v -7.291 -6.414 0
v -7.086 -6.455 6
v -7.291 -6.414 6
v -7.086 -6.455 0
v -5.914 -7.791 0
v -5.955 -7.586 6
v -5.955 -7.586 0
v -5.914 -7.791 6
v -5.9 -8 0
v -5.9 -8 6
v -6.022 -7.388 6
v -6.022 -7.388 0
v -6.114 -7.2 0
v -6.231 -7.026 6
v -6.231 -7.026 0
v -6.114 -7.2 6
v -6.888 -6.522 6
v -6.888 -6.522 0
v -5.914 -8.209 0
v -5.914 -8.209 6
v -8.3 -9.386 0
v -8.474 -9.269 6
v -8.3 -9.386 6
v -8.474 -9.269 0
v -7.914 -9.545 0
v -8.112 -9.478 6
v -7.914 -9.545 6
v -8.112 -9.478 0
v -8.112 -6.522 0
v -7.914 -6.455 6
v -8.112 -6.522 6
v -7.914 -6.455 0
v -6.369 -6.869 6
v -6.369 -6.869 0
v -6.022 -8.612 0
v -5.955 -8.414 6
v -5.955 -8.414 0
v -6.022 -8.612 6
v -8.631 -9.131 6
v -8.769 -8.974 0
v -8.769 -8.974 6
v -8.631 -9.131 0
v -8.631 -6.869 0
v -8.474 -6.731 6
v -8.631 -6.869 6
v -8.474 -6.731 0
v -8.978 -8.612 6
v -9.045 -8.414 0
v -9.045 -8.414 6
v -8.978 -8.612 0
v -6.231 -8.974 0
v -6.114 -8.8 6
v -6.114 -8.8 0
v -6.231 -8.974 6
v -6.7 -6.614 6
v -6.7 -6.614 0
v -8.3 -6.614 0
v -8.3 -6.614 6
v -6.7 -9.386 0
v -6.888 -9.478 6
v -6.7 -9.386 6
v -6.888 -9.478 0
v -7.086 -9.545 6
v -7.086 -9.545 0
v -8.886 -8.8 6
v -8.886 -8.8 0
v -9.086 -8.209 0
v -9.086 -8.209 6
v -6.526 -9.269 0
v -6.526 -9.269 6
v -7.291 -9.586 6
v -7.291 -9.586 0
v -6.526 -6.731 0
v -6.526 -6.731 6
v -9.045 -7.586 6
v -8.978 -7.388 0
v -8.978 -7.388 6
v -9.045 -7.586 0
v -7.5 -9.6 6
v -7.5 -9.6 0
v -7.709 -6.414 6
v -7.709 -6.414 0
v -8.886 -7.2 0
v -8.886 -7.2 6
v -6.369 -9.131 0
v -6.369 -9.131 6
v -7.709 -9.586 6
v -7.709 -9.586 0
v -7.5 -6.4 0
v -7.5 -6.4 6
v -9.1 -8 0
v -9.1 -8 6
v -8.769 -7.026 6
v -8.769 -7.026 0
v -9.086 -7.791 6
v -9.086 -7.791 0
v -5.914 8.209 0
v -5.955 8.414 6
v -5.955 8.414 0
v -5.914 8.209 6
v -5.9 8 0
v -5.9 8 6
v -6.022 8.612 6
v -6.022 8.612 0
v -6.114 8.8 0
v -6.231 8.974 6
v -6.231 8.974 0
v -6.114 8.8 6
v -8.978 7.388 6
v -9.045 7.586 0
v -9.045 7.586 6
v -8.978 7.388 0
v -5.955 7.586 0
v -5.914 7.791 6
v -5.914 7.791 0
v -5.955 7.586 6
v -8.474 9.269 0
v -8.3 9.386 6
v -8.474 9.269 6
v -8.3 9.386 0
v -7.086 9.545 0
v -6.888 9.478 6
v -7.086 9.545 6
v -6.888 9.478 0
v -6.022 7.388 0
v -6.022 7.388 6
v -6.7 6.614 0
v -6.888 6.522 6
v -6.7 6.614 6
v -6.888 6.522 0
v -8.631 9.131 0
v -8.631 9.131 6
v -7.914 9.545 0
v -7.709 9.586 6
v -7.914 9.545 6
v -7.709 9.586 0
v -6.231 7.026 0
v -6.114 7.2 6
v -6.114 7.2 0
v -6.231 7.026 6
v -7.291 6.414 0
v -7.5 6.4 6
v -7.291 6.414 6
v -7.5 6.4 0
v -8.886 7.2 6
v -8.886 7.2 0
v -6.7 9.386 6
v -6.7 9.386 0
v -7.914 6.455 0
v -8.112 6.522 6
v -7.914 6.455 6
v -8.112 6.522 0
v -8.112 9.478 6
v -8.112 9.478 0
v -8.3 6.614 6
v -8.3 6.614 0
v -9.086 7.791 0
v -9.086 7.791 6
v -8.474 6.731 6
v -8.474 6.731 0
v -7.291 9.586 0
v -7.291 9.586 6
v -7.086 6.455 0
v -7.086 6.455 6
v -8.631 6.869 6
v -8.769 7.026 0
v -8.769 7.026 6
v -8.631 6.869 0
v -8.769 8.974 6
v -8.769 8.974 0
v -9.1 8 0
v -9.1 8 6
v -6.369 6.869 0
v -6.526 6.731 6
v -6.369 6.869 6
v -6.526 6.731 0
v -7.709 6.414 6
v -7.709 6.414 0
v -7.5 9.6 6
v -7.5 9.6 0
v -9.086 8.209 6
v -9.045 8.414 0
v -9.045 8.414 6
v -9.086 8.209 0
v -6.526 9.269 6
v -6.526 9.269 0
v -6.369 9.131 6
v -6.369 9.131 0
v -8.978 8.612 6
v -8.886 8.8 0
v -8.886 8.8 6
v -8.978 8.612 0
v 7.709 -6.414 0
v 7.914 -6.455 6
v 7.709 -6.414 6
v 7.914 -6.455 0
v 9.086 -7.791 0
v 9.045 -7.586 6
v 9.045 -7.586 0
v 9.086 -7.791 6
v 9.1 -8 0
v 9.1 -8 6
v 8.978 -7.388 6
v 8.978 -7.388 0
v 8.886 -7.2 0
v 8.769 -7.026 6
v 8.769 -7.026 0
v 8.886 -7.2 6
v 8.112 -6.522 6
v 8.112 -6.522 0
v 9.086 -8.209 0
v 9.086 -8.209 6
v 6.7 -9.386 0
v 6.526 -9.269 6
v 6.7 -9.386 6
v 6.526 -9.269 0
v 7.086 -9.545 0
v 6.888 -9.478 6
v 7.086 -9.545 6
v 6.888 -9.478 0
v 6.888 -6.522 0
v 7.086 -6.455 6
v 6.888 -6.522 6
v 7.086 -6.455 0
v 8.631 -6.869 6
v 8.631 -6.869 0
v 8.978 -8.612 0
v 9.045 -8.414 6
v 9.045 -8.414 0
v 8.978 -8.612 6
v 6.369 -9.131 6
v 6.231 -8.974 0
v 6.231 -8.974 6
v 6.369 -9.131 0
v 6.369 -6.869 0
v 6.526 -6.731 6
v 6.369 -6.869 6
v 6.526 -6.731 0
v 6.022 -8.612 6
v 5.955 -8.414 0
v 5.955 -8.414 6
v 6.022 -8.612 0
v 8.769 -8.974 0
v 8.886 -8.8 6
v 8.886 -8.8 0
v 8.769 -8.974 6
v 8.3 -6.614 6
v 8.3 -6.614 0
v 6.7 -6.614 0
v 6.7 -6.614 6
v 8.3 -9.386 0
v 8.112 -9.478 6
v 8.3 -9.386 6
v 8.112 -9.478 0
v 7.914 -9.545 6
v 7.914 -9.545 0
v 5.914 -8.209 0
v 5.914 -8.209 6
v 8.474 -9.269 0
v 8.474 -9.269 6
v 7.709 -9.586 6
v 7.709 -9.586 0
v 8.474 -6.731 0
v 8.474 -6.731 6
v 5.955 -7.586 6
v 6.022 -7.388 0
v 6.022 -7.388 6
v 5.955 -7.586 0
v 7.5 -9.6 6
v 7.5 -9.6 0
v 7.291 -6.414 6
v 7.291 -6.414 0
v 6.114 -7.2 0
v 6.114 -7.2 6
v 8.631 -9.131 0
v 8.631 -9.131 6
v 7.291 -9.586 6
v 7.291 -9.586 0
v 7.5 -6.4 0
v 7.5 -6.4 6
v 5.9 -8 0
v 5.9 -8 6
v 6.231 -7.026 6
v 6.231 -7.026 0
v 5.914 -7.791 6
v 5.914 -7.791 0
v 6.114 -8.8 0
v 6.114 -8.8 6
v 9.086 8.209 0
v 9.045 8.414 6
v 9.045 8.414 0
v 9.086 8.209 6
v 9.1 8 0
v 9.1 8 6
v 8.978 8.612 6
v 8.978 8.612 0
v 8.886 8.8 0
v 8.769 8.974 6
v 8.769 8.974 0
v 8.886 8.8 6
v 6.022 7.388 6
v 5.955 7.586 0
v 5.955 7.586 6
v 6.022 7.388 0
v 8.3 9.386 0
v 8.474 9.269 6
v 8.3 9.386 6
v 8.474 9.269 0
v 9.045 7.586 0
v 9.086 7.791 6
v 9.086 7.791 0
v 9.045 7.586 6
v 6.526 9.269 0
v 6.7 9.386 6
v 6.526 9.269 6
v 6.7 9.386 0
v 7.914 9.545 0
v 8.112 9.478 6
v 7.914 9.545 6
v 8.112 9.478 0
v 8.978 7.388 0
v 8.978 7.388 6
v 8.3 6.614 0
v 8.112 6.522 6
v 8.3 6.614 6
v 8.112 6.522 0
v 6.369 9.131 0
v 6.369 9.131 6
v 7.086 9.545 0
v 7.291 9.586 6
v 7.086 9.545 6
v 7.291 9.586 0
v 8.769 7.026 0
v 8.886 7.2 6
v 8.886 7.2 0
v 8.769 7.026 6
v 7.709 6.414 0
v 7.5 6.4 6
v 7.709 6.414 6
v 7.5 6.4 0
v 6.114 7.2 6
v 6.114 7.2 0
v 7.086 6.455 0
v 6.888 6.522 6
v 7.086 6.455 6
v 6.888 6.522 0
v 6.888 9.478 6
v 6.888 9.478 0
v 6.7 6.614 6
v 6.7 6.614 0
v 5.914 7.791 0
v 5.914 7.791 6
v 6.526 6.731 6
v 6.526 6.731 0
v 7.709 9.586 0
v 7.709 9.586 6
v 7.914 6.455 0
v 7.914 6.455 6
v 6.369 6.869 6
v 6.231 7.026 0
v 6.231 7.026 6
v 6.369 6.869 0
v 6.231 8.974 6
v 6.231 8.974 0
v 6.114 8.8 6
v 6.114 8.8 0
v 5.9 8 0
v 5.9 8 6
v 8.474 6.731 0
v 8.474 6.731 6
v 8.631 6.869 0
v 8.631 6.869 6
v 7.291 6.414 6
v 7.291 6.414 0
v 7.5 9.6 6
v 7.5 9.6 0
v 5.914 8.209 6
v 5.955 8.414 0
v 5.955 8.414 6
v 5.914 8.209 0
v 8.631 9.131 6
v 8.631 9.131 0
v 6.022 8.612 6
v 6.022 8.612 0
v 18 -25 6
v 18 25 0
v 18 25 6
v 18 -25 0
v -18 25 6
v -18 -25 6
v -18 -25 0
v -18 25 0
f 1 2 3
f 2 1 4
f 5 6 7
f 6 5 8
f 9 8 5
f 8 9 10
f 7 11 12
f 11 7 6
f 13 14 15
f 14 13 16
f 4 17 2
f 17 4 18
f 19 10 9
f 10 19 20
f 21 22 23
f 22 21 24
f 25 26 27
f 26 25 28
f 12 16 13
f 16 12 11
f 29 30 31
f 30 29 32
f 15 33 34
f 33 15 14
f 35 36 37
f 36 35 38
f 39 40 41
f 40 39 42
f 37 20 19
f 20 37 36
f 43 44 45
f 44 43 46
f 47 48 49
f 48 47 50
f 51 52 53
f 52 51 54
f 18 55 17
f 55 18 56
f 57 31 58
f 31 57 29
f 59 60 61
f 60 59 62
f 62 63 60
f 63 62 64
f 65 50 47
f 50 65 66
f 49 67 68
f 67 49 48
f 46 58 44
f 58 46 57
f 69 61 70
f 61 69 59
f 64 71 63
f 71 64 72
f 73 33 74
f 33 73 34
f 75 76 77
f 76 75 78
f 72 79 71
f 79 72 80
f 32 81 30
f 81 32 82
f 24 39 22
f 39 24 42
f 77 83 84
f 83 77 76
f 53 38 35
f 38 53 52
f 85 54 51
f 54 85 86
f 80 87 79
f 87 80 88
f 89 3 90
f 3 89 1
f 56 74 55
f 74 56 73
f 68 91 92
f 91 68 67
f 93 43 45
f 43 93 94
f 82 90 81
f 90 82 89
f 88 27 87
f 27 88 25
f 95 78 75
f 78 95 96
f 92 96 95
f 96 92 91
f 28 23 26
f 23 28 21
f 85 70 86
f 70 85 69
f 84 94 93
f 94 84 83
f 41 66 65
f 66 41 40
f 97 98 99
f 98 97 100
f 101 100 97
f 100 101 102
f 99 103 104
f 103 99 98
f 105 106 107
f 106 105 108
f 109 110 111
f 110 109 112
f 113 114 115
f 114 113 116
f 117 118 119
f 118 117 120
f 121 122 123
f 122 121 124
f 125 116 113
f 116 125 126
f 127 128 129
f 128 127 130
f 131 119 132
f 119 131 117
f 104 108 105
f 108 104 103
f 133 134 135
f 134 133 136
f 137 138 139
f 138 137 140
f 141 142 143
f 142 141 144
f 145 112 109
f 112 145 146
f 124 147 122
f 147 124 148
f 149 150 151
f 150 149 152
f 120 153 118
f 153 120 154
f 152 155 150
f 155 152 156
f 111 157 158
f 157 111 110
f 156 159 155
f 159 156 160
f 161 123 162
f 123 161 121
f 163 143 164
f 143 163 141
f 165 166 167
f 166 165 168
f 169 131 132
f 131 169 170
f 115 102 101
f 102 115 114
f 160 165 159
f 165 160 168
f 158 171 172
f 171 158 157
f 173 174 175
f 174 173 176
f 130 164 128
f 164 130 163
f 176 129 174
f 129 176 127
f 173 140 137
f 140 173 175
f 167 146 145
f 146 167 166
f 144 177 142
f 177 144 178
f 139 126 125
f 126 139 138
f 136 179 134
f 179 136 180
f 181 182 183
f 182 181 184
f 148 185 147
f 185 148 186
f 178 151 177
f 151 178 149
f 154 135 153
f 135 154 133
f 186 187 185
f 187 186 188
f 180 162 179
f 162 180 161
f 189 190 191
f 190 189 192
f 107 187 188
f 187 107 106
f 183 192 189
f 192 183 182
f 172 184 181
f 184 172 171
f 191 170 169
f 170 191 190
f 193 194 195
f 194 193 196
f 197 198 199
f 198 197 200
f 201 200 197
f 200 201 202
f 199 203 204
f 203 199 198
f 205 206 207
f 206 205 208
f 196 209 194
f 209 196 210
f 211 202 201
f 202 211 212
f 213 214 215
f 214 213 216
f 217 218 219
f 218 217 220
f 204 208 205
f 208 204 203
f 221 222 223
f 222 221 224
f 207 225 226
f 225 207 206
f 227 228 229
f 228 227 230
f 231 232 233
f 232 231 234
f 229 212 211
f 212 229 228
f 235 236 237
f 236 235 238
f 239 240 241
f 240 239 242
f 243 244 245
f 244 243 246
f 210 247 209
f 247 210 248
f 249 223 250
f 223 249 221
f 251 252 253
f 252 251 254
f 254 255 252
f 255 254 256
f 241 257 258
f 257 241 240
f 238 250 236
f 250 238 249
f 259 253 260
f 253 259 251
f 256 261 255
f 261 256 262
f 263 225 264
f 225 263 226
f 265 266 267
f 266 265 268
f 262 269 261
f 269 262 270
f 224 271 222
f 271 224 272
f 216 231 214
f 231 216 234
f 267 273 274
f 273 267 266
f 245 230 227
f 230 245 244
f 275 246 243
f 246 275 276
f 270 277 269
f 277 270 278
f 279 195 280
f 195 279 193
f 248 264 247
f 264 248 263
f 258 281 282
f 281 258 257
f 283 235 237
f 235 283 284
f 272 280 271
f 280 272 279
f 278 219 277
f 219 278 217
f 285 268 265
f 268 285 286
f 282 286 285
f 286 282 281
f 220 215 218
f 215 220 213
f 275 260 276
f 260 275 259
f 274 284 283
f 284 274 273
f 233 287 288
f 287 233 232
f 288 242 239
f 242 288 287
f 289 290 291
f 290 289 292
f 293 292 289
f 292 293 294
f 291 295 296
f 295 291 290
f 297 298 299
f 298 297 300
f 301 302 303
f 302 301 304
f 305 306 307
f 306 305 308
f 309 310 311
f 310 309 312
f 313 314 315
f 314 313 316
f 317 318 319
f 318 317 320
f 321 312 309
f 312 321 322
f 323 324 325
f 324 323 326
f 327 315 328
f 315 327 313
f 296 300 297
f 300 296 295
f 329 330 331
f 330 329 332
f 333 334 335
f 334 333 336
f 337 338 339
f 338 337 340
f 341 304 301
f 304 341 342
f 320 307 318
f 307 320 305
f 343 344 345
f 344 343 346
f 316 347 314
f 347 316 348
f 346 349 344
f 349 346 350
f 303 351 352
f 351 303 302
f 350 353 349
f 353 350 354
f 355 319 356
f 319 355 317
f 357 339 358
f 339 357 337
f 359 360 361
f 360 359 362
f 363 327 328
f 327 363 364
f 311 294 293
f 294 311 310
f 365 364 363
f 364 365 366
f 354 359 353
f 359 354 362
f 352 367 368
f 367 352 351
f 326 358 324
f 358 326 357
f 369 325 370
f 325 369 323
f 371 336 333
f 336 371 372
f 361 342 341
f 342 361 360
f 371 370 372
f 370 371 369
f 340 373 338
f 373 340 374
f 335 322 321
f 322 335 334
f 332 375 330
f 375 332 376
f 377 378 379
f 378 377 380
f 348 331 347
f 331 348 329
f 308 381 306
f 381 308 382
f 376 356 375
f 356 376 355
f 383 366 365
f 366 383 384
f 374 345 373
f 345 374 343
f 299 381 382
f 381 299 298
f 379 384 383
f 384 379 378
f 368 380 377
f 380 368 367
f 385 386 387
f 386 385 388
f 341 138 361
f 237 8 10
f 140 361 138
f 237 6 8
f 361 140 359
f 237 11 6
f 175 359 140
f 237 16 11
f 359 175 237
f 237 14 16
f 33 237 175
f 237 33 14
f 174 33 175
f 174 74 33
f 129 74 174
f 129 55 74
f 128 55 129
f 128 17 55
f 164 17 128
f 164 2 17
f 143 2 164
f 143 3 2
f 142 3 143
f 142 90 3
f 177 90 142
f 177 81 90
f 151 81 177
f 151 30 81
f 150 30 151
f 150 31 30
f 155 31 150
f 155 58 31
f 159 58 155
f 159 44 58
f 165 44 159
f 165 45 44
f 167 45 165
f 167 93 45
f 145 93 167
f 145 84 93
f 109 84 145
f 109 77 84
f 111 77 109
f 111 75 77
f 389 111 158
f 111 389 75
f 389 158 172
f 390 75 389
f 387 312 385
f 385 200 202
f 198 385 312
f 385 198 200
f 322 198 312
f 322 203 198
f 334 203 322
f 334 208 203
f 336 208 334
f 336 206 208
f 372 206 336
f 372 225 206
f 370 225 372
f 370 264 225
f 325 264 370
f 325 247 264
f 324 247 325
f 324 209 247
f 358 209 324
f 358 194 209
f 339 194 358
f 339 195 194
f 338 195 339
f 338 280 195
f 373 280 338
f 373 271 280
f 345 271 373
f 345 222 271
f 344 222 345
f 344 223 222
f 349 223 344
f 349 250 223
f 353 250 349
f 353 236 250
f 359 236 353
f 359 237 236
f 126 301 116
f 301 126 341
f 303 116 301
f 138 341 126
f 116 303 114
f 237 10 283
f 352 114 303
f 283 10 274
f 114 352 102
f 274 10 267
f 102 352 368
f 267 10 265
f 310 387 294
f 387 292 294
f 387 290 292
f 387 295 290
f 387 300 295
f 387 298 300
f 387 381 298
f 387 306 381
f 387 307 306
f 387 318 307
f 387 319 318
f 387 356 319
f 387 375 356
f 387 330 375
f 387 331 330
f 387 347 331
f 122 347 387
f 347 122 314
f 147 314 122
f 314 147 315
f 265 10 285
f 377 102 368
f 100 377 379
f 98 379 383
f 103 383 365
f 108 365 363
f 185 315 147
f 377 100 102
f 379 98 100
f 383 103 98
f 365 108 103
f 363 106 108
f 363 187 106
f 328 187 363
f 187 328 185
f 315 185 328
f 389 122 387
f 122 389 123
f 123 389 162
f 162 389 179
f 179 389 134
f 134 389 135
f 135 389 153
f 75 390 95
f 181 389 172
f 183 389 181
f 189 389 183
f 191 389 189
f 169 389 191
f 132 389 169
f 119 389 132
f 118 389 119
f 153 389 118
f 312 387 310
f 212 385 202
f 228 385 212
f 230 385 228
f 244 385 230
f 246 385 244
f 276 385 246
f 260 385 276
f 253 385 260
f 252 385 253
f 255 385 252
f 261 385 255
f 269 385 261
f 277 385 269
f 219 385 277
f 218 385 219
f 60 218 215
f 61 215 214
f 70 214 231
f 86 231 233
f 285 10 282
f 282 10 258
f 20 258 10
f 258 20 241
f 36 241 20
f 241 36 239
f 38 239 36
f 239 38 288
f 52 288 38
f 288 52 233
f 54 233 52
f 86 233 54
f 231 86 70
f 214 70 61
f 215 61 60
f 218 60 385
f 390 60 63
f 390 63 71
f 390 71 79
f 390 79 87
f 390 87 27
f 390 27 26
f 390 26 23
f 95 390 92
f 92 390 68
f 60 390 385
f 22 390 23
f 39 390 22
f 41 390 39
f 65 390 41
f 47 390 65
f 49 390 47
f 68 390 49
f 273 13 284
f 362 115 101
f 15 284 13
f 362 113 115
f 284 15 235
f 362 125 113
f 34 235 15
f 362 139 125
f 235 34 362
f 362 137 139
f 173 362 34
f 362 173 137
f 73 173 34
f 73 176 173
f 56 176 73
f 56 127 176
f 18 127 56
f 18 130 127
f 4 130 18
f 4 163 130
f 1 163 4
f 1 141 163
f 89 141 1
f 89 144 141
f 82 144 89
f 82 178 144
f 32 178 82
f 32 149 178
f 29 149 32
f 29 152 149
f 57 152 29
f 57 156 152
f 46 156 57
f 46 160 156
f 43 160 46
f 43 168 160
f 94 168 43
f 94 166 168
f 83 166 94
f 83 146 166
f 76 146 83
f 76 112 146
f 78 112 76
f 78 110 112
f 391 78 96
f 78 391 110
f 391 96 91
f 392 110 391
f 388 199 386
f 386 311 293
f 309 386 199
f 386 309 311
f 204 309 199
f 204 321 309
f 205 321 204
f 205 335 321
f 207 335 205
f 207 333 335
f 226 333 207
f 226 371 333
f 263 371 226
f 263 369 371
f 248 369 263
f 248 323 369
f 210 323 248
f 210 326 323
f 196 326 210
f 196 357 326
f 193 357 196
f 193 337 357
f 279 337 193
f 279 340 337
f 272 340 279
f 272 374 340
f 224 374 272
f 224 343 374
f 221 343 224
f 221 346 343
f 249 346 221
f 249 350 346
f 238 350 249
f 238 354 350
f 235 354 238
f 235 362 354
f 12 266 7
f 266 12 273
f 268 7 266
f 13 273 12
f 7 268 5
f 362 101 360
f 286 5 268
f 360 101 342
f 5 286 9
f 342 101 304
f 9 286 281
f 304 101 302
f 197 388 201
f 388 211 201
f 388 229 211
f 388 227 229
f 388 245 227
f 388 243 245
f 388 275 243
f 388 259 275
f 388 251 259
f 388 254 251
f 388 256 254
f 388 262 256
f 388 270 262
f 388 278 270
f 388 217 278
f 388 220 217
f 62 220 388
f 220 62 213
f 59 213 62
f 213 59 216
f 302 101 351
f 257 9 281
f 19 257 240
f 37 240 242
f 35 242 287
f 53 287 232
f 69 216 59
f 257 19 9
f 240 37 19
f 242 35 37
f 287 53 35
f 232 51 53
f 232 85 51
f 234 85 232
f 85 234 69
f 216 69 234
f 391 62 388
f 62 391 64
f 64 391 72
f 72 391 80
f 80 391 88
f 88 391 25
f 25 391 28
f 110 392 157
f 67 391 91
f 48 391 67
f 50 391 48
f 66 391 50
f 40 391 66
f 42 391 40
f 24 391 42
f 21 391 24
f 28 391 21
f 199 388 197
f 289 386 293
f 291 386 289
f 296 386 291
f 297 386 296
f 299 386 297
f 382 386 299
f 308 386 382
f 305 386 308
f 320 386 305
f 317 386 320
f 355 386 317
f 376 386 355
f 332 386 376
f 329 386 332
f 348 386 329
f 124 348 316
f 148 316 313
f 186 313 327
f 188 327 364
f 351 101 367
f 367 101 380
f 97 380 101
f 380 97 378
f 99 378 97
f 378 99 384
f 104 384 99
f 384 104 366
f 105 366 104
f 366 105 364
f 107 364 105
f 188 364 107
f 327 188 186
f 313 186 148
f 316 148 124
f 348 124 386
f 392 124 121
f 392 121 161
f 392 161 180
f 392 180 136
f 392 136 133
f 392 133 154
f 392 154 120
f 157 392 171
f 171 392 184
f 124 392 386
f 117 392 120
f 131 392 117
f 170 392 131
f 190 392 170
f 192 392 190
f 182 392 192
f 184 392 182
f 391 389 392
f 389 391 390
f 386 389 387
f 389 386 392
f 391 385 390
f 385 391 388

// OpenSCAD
// Phase 1 starter: plate that bolts to a standard MGN9H carriage (HIWIN pattern).
// Hole centers: 15 mm (across rail) × 16 mm (along rail). Threads: M3.
// Next: add Sprite gearbox bosses once hole pattern is measured from the STEP.

$fn = 48;

mgn_b = 15;   // across rail
mgn_c = 16;   // along rail
mgn_hole = 3.2; // clearance for M3 screw into carriage
plate_t = 6;
plate_w = 36; // across
plate_l = 50; // along (room for Sprite later)

module mgn9h_holes() {
  for (x = [-mgn_b/2, mgn_b/2], y = [-mgn_c/2, mgn_c/2])
    translate([x, y, -0.1])
      cylinder(d = mgn_hole, h = plate_t + 0.2);
}

difference() {
  // plate: Y = along rail, X = across
  translate([-plate_w/2, -plate_l/2, 0])
    cube([plate_w, plate_l, plate_t]);
  mgn9h_holes();
}

// Visual helpers (not printed) — uncomment to check
// % translate([-10, -19.95, -10]) cube([20, 39.9, 10]); // MGN9H block approx
